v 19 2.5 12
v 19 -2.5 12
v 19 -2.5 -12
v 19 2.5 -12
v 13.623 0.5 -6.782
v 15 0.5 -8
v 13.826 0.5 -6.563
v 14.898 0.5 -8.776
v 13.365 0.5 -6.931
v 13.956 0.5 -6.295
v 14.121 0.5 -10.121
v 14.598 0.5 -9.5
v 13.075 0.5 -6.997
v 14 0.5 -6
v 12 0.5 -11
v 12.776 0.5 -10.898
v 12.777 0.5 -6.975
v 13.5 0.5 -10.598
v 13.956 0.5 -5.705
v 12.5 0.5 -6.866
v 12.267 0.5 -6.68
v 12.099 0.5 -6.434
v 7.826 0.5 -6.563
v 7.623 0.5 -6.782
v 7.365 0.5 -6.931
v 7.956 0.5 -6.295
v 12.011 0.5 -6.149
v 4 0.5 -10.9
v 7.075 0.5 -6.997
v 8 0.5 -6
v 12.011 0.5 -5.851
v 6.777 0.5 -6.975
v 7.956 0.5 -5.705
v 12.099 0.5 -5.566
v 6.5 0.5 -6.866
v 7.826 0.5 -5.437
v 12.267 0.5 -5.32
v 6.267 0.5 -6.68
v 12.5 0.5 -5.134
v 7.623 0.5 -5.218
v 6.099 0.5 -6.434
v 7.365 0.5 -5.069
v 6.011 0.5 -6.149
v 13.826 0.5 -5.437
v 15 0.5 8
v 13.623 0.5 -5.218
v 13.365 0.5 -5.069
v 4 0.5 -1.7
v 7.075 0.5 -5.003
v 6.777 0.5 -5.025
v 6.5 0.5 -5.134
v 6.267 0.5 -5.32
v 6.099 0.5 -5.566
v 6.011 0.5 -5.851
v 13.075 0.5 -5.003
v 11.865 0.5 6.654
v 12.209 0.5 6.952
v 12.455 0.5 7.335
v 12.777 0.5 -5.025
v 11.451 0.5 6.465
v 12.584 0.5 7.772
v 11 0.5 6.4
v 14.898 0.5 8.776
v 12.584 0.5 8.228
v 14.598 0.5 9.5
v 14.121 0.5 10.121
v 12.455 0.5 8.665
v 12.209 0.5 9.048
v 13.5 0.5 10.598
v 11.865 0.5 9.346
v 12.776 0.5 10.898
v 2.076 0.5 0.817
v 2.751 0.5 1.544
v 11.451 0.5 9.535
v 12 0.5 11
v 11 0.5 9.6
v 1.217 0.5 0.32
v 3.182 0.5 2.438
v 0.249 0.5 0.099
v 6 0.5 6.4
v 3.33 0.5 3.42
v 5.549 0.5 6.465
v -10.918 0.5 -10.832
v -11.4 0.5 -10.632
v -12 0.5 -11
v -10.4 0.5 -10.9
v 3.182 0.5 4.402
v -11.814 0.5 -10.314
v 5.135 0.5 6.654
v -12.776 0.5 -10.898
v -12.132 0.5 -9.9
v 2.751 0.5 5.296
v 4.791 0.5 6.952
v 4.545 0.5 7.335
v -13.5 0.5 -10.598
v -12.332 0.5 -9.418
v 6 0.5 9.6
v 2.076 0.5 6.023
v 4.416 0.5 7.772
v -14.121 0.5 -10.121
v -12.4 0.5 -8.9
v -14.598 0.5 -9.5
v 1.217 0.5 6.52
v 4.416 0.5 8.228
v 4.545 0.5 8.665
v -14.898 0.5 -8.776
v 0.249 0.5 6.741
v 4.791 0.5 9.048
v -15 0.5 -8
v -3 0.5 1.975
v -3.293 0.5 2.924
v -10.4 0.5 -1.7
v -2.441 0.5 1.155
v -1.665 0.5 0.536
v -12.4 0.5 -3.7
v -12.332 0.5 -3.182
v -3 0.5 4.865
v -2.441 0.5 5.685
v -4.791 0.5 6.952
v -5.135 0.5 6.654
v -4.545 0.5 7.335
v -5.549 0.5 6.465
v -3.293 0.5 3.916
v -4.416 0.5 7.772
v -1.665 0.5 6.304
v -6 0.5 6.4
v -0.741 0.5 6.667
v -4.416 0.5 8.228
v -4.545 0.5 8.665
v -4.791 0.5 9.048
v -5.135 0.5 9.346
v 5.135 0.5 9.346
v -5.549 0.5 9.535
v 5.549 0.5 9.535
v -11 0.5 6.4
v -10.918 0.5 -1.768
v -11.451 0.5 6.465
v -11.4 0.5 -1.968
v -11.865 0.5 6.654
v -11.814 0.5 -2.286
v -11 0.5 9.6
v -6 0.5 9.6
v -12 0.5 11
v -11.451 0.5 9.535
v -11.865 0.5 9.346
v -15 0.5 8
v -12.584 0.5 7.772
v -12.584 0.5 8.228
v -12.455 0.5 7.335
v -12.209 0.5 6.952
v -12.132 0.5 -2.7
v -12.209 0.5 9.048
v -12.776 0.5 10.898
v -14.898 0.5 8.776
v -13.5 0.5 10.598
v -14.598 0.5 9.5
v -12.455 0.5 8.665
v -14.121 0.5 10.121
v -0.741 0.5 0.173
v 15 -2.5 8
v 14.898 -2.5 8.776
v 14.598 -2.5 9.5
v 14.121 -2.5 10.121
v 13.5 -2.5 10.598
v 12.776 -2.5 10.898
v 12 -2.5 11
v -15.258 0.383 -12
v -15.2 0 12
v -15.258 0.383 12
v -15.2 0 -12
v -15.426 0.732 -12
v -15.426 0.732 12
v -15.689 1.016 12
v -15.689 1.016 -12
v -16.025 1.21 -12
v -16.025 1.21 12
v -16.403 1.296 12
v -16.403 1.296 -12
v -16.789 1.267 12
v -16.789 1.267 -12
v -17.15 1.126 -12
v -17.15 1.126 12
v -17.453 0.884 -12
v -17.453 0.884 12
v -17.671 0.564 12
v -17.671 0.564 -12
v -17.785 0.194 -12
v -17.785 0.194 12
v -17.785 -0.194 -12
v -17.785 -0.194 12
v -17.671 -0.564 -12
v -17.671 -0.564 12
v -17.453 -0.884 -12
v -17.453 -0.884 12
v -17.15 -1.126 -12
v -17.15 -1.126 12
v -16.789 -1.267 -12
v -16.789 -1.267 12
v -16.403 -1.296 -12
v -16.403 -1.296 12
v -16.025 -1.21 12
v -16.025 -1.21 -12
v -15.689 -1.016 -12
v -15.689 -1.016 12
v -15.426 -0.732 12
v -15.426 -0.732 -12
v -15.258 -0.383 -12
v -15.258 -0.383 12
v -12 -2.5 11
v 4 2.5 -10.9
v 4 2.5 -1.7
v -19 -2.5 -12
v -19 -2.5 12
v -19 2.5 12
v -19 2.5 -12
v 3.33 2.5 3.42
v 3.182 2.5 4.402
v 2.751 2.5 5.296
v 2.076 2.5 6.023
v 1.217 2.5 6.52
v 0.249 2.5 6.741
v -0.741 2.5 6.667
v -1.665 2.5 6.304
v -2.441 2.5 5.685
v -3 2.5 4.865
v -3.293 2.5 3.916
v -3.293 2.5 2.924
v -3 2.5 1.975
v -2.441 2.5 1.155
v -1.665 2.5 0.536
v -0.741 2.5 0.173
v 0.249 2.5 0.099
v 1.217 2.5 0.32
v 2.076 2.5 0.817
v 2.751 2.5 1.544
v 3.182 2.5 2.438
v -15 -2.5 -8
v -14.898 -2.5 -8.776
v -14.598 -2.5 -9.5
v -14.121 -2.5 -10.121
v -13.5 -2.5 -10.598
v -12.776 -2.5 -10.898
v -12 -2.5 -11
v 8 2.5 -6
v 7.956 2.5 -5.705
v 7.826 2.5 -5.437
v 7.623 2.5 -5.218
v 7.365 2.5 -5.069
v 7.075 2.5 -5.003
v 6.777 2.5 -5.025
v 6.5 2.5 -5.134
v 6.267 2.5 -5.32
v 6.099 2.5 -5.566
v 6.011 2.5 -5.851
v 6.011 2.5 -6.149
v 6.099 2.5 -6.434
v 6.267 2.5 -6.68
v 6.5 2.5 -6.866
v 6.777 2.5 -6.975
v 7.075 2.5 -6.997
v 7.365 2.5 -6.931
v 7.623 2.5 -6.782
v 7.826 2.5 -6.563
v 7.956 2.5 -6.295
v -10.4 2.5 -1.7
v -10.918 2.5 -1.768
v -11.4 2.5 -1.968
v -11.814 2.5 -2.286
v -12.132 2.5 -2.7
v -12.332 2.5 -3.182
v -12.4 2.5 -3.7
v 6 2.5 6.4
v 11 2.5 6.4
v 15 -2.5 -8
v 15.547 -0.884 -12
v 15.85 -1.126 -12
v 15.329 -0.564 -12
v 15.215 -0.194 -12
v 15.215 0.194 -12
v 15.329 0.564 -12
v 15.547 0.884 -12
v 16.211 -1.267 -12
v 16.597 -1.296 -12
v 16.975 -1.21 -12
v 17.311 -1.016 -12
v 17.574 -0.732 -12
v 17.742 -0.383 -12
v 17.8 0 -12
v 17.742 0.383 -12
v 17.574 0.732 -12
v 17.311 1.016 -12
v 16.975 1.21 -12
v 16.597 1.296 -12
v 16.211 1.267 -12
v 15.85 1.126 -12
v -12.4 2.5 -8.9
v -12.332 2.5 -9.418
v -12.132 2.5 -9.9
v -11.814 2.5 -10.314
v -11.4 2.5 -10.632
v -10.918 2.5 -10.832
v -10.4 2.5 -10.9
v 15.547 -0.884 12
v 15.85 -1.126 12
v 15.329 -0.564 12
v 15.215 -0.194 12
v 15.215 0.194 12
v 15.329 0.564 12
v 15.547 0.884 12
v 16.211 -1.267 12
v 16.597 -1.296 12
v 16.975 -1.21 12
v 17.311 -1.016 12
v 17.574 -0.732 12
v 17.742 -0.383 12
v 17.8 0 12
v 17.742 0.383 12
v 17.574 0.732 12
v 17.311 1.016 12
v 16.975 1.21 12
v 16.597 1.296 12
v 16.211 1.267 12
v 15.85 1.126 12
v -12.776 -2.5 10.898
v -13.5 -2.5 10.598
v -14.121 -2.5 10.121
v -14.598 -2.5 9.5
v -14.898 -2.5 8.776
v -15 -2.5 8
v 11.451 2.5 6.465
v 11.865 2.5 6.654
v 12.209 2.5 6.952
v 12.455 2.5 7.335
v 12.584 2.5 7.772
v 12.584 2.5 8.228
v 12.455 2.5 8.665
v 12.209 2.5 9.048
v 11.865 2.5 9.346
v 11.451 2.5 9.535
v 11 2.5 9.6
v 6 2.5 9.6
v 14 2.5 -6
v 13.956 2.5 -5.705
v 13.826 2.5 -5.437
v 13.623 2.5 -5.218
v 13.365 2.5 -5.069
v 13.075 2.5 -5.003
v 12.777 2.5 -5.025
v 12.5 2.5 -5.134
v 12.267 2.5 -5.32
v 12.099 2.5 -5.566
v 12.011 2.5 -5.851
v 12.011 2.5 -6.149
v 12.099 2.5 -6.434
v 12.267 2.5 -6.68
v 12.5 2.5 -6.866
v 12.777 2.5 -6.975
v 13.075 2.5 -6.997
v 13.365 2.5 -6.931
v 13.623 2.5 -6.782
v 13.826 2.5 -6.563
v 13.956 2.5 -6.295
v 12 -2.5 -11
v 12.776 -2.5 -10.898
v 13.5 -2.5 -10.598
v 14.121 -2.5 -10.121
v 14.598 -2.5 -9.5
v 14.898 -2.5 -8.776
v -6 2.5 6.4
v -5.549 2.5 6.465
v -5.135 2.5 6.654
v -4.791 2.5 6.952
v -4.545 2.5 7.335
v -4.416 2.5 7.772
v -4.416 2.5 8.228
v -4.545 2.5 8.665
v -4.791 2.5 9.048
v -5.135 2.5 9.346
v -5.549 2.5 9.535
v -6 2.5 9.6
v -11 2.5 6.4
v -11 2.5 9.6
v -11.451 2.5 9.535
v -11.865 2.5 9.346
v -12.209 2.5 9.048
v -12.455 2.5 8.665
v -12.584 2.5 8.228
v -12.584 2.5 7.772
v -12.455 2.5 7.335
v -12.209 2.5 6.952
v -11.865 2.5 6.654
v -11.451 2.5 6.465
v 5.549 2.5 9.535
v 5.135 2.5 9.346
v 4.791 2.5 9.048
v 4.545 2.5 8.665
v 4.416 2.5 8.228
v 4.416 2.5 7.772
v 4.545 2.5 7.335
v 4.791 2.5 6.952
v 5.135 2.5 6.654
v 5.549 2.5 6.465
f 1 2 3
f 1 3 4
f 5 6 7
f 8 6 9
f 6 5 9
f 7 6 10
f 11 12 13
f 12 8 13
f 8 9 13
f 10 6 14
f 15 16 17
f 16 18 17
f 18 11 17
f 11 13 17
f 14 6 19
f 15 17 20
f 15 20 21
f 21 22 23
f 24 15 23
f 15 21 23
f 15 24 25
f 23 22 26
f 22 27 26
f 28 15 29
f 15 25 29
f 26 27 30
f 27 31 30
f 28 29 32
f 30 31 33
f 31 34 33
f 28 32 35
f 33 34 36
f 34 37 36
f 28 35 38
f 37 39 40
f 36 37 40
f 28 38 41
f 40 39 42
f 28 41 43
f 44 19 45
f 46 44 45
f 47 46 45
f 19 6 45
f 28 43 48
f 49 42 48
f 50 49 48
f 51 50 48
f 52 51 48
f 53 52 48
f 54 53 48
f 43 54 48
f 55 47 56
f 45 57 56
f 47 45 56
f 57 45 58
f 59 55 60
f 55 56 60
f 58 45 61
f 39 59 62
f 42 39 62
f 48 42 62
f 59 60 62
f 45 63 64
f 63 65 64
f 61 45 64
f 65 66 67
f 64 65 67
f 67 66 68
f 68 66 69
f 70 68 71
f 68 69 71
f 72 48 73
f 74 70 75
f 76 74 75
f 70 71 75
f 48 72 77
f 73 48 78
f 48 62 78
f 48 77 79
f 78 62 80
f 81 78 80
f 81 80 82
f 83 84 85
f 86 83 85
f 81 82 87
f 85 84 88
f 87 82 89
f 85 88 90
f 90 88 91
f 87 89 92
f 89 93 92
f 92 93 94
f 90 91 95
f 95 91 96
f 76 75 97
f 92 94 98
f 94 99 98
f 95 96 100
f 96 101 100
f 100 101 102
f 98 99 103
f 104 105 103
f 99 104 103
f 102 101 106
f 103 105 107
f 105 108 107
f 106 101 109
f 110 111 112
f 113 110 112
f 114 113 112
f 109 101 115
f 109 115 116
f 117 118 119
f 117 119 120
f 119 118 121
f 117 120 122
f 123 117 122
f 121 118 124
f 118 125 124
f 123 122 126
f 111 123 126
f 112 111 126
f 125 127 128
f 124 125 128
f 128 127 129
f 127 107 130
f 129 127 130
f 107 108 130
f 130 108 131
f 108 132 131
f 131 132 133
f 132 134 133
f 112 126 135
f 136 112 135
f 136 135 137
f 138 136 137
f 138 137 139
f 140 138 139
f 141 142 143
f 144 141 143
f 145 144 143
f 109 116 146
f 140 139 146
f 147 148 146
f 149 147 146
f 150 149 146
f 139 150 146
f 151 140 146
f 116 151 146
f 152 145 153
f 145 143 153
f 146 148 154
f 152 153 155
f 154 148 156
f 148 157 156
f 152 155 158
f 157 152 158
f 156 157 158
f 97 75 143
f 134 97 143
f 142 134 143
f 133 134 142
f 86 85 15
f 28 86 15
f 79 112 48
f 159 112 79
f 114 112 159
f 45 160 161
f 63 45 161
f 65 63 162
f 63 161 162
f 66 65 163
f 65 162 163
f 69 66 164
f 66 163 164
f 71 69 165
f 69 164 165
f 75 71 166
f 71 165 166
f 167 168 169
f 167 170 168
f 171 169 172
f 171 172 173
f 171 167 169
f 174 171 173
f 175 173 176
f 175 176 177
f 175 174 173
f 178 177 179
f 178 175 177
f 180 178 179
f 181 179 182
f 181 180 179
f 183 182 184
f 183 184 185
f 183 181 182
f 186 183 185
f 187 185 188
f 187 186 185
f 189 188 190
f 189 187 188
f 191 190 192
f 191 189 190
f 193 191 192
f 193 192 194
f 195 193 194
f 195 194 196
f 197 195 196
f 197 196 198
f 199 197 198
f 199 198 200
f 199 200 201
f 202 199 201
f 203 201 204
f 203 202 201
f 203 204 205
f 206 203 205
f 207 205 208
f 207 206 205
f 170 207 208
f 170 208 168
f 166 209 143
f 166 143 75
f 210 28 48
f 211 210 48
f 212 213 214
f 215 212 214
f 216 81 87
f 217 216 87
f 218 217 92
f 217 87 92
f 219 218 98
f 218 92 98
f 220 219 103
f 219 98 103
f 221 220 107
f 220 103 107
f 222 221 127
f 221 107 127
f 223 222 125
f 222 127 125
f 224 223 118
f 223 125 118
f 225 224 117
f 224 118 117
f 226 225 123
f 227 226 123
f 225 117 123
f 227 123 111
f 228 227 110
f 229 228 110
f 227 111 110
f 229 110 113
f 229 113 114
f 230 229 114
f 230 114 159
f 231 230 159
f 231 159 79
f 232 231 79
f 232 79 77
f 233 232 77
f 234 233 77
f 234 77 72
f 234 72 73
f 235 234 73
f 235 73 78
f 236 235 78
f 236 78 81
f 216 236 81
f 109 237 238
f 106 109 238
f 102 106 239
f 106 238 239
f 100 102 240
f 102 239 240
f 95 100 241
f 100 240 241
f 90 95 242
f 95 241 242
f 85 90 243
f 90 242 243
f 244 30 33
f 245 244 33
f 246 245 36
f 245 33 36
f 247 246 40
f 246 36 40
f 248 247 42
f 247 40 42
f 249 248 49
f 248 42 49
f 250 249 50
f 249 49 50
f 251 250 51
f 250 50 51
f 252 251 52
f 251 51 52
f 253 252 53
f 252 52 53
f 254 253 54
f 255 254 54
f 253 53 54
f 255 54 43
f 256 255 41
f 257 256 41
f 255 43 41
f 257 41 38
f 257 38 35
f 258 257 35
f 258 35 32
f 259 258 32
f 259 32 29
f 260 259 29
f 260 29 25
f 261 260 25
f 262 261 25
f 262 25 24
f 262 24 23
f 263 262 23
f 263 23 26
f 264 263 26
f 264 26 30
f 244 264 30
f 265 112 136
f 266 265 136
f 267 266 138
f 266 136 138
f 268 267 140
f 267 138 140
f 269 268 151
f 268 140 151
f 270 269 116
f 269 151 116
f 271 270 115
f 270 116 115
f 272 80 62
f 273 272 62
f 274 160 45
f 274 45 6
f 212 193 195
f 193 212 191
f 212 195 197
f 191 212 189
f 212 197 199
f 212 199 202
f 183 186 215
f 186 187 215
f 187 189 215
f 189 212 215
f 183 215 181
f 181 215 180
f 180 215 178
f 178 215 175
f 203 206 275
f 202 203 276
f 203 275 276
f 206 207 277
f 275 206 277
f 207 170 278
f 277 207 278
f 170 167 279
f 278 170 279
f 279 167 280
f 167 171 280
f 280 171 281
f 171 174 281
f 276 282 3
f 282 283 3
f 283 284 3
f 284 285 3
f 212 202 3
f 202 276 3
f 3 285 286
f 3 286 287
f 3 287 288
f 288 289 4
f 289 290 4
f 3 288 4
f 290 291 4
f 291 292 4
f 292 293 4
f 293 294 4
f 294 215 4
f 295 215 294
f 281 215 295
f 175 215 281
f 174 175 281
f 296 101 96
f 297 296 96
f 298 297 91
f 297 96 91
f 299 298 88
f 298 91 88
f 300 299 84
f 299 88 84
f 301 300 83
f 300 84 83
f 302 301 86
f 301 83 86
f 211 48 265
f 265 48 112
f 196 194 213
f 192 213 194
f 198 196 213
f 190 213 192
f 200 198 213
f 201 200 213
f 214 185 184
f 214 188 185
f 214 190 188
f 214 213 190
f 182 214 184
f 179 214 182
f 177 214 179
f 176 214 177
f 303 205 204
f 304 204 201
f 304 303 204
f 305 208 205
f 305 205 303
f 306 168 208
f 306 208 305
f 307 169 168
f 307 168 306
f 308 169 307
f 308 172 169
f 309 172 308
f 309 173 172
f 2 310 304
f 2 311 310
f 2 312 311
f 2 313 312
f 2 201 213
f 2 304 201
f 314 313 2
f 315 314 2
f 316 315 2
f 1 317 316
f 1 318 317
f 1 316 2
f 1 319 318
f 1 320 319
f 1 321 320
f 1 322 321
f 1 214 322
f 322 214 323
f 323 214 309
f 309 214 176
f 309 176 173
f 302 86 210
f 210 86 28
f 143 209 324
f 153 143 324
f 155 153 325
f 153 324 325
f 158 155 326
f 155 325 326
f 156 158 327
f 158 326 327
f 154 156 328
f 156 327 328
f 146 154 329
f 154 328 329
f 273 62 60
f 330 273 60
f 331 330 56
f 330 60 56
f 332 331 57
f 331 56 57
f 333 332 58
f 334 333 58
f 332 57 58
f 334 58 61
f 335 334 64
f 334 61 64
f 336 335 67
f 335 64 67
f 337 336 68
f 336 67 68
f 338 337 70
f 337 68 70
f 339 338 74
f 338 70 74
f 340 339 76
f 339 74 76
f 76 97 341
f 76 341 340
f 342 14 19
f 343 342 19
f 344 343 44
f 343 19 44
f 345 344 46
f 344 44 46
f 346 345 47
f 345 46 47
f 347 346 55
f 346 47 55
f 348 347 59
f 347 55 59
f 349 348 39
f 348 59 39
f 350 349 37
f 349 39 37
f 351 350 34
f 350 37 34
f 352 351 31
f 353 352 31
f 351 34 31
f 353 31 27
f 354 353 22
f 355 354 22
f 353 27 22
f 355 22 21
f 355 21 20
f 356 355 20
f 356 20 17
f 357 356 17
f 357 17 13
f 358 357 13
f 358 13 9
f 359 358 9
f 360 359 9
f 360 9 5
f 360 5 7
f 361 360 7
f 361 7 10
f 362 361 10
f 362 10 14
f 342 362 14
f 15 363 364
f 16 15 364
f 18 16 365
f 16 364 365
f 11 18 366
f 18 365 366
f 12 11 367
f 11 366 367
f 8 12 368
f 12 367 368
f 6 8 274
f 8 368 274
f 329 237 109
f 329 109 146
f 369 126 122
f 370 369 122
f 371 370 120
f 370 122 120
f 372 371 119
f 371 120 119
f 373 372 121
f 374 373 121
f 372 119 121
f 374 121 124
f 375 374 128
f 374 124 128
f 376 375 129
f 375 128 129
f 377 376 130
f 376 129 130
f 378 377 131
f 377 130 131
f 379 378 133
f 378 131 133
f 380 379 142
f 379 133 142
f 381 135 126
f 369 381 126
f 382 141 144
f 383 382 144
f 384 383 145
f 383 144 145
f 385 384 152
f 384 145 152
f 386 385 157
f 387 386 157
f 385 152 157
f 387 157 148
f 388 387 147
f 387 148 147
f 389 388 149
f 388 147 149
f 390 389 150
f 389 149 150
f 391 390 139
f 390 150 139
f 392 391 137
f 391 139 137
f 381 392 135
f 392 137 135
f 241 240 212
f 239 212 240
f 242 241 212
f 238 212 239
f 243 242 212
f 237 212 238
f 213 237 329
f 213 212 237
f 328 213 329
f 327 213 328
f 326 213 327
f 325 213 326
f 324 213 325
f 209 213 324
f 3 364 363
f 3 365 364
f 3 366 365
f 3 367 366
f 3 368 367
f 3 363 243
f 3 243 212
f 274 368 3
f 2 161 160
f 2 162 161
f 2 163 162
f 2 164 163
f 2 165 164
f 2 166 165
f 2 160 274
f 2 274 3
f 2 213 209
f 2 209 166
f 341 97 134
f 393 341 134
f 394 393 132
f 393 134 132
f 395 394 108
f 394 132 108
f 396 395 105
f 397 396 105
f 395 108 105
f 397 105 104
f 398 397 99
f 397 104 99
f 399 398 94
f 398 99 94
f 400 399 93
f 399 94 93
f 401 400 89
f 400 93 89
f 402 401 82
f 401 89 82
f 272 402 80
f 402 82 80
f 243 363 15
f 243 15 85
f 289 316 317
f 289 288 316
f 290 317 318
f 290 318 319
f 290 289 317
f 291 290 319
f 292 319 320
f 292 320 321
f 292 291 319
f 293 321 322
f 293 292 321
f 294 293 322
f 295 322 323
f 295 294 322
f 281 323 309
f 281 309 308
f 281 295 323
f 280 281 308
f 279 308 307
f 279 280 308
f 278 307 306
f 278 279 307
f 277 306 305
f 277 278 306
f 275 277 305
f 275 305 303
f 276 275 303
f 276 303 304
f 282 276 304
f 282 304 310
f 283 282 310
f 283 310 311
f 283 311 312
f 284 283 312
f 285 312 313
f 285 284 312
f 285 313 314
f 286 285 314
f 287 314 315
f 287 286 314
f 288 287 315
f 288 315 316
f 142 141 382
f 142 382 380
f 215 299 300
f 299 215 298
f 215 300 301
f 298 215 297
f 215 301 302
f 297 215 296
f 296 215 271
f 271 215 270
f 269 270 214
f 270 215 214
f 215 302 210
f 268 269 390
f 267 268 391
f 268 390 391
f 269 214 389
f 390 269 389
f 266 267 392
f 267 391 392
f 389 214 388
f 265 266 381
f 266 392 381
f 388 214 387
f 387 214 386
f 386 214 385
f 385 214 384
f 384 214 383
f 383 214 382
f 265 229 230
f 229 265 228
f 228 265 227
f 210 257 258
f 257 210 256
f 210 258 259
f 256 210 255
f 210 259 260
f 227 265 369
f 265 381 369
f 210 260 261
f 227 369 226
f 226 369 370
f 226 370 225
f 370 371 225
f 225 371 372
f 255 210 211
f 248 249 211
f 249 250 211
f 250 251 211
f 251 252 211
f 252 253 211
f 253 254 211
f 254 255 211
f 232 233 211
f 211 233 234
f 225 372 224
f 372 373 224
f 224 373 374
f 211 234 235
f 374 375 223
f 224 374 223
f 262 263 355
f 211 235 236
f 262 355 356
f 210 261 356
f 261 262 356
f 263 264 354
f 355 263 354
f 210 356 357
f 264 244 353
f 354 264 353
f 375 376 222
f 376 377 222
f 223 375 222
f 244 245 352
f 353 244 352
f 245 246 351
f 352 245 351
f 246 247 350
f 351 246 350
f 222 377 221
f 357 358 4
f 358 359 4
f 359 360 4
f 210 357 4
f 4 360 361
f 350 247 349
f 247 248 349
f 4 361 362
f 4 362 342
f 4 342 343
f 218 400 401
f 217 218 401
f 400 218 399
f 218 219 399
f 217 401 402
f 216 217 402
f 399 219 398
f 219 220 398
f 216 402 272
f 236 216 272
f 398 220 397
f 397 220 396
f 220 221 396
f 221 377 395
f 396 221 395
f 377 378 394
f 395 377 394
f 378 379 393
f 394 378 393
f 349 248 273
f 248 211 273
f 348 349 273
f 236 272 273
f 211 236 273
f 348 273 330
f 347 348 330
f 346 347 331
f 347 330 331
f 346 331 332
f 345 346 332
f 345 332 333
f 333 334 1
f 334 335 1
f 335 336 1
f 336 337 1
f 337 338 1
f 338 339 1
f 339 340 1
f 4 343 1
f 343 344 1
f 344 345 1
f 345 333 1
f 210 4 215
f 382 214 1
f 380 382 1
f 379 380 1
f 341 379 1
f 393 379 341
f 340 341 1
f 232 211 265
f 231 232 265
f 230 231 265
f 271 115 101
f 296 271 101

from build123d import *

# Parameters (mm, degrees)
SKETCH_W        = 38
SKETCH_H        = 5
SKETCH_R        = 1.3
PAD_DEPTH       = 12
SKETCH001_R     = 3.33
SKETCH001_R_2   = 1
POCKET_DEPTH    = 5.001
POCKET001_DEPTH = 3


with BuildPart() as part:
    # Sketch → Pad (new body, symmetric)
    with BuildSketch(Plane.XY):
        Rectangle(SKETCH_W, SKETCH_H)
        with Locations((-16.5, 0)):
            Circle(SKETCH_R, mode=Mode.SUBTRACT)
        with Locations((16.5, 0)):
            Circle(SKETCH_R, mode=Mode.SUBTRACT)
    extrude(amount=PAD_DEPTH, both=True)

    # Sketch001 (on Face3 of Pad) → Pocket (cut, through all)
    with BuildSketch(Plane.XZ.offset(2.5)):
        with Locations((0, 3.42)):
            Circle(SKETCH001_R)
        with Locations((7, -6)):
            Circle(SKETCH001_R_2)
        with Locations((13, -6)):
            Circle(SKETCH001_R_2)
        with BuildLine():
            Line((4, -1.7), (-10.4, -1.7))
            ThreePointArc((-10.4, -1.7), (-11.814214, -2.285786), (-12.4, -3.7))
            Line((-12.4, -3.7), (-12.4, -8.9))
            ThreePointArc((-12.4, -8.9), (-11.814214, -10.314214), (-10.4, -10.9))
            Line((-10.4, -10.9), (4, -10.9))
            Line((4, -10.9), (4, -1.7))
        make_face()
        with BuildLine():
            ThreePointArc((-11, 9.6), (-12.6, 8), (-11, 6.4))
            Line((-11, 6.4), (-6, 6.4))
            ThreePointArc((-6, 6.4), (-4.4, 8), (-6, 9.6))
            Line((-11, 9.6), (-6, 9.6))
        make_face()
        with BuildLine():
            ThreePointArc((6, 9.6), (4.4, 8), (6, 6.4))
            Line((6, 6.4), (11, 6.4))
            ThreePointArc((11, 6.4), (12.6, 8), (11, 9.6))
            Line((6, 9.6), (11, 9.6))
        make_face()
    extrude(amount=-POCKET_DEPTH, mode=Mode.SUBTRACT)

    # Sketch002 (on Face23 of Pocket) → Pocket001 (cut)
    with BuildSketch(Plane.XZ.offset(2.5)):
        with BuildLine():
            Line((-12, 11), (12, 11))
            ThreePointArc((15, 8), (14.12132, 10.12132), (12, 11))
            Line((15, 8), (15, -8))
            ThreePointArc((12, -11), (14.12132, -10.12132), (15, -8))
            Line((12, -11), (-12, -11))
            ThreePointArc((-15, -8), (-14.12132, -10.12132), (-12, -11))
            Line((-15, -8), (-15, 8))
            ThreePointArc((-12, 11), (-14.12132, 10.12132), (-15, 8))
        make_face()
    extrude(amount=-POCKET001_DEPTH, mode=Mode.SUBTRACT)


solid = part.part
